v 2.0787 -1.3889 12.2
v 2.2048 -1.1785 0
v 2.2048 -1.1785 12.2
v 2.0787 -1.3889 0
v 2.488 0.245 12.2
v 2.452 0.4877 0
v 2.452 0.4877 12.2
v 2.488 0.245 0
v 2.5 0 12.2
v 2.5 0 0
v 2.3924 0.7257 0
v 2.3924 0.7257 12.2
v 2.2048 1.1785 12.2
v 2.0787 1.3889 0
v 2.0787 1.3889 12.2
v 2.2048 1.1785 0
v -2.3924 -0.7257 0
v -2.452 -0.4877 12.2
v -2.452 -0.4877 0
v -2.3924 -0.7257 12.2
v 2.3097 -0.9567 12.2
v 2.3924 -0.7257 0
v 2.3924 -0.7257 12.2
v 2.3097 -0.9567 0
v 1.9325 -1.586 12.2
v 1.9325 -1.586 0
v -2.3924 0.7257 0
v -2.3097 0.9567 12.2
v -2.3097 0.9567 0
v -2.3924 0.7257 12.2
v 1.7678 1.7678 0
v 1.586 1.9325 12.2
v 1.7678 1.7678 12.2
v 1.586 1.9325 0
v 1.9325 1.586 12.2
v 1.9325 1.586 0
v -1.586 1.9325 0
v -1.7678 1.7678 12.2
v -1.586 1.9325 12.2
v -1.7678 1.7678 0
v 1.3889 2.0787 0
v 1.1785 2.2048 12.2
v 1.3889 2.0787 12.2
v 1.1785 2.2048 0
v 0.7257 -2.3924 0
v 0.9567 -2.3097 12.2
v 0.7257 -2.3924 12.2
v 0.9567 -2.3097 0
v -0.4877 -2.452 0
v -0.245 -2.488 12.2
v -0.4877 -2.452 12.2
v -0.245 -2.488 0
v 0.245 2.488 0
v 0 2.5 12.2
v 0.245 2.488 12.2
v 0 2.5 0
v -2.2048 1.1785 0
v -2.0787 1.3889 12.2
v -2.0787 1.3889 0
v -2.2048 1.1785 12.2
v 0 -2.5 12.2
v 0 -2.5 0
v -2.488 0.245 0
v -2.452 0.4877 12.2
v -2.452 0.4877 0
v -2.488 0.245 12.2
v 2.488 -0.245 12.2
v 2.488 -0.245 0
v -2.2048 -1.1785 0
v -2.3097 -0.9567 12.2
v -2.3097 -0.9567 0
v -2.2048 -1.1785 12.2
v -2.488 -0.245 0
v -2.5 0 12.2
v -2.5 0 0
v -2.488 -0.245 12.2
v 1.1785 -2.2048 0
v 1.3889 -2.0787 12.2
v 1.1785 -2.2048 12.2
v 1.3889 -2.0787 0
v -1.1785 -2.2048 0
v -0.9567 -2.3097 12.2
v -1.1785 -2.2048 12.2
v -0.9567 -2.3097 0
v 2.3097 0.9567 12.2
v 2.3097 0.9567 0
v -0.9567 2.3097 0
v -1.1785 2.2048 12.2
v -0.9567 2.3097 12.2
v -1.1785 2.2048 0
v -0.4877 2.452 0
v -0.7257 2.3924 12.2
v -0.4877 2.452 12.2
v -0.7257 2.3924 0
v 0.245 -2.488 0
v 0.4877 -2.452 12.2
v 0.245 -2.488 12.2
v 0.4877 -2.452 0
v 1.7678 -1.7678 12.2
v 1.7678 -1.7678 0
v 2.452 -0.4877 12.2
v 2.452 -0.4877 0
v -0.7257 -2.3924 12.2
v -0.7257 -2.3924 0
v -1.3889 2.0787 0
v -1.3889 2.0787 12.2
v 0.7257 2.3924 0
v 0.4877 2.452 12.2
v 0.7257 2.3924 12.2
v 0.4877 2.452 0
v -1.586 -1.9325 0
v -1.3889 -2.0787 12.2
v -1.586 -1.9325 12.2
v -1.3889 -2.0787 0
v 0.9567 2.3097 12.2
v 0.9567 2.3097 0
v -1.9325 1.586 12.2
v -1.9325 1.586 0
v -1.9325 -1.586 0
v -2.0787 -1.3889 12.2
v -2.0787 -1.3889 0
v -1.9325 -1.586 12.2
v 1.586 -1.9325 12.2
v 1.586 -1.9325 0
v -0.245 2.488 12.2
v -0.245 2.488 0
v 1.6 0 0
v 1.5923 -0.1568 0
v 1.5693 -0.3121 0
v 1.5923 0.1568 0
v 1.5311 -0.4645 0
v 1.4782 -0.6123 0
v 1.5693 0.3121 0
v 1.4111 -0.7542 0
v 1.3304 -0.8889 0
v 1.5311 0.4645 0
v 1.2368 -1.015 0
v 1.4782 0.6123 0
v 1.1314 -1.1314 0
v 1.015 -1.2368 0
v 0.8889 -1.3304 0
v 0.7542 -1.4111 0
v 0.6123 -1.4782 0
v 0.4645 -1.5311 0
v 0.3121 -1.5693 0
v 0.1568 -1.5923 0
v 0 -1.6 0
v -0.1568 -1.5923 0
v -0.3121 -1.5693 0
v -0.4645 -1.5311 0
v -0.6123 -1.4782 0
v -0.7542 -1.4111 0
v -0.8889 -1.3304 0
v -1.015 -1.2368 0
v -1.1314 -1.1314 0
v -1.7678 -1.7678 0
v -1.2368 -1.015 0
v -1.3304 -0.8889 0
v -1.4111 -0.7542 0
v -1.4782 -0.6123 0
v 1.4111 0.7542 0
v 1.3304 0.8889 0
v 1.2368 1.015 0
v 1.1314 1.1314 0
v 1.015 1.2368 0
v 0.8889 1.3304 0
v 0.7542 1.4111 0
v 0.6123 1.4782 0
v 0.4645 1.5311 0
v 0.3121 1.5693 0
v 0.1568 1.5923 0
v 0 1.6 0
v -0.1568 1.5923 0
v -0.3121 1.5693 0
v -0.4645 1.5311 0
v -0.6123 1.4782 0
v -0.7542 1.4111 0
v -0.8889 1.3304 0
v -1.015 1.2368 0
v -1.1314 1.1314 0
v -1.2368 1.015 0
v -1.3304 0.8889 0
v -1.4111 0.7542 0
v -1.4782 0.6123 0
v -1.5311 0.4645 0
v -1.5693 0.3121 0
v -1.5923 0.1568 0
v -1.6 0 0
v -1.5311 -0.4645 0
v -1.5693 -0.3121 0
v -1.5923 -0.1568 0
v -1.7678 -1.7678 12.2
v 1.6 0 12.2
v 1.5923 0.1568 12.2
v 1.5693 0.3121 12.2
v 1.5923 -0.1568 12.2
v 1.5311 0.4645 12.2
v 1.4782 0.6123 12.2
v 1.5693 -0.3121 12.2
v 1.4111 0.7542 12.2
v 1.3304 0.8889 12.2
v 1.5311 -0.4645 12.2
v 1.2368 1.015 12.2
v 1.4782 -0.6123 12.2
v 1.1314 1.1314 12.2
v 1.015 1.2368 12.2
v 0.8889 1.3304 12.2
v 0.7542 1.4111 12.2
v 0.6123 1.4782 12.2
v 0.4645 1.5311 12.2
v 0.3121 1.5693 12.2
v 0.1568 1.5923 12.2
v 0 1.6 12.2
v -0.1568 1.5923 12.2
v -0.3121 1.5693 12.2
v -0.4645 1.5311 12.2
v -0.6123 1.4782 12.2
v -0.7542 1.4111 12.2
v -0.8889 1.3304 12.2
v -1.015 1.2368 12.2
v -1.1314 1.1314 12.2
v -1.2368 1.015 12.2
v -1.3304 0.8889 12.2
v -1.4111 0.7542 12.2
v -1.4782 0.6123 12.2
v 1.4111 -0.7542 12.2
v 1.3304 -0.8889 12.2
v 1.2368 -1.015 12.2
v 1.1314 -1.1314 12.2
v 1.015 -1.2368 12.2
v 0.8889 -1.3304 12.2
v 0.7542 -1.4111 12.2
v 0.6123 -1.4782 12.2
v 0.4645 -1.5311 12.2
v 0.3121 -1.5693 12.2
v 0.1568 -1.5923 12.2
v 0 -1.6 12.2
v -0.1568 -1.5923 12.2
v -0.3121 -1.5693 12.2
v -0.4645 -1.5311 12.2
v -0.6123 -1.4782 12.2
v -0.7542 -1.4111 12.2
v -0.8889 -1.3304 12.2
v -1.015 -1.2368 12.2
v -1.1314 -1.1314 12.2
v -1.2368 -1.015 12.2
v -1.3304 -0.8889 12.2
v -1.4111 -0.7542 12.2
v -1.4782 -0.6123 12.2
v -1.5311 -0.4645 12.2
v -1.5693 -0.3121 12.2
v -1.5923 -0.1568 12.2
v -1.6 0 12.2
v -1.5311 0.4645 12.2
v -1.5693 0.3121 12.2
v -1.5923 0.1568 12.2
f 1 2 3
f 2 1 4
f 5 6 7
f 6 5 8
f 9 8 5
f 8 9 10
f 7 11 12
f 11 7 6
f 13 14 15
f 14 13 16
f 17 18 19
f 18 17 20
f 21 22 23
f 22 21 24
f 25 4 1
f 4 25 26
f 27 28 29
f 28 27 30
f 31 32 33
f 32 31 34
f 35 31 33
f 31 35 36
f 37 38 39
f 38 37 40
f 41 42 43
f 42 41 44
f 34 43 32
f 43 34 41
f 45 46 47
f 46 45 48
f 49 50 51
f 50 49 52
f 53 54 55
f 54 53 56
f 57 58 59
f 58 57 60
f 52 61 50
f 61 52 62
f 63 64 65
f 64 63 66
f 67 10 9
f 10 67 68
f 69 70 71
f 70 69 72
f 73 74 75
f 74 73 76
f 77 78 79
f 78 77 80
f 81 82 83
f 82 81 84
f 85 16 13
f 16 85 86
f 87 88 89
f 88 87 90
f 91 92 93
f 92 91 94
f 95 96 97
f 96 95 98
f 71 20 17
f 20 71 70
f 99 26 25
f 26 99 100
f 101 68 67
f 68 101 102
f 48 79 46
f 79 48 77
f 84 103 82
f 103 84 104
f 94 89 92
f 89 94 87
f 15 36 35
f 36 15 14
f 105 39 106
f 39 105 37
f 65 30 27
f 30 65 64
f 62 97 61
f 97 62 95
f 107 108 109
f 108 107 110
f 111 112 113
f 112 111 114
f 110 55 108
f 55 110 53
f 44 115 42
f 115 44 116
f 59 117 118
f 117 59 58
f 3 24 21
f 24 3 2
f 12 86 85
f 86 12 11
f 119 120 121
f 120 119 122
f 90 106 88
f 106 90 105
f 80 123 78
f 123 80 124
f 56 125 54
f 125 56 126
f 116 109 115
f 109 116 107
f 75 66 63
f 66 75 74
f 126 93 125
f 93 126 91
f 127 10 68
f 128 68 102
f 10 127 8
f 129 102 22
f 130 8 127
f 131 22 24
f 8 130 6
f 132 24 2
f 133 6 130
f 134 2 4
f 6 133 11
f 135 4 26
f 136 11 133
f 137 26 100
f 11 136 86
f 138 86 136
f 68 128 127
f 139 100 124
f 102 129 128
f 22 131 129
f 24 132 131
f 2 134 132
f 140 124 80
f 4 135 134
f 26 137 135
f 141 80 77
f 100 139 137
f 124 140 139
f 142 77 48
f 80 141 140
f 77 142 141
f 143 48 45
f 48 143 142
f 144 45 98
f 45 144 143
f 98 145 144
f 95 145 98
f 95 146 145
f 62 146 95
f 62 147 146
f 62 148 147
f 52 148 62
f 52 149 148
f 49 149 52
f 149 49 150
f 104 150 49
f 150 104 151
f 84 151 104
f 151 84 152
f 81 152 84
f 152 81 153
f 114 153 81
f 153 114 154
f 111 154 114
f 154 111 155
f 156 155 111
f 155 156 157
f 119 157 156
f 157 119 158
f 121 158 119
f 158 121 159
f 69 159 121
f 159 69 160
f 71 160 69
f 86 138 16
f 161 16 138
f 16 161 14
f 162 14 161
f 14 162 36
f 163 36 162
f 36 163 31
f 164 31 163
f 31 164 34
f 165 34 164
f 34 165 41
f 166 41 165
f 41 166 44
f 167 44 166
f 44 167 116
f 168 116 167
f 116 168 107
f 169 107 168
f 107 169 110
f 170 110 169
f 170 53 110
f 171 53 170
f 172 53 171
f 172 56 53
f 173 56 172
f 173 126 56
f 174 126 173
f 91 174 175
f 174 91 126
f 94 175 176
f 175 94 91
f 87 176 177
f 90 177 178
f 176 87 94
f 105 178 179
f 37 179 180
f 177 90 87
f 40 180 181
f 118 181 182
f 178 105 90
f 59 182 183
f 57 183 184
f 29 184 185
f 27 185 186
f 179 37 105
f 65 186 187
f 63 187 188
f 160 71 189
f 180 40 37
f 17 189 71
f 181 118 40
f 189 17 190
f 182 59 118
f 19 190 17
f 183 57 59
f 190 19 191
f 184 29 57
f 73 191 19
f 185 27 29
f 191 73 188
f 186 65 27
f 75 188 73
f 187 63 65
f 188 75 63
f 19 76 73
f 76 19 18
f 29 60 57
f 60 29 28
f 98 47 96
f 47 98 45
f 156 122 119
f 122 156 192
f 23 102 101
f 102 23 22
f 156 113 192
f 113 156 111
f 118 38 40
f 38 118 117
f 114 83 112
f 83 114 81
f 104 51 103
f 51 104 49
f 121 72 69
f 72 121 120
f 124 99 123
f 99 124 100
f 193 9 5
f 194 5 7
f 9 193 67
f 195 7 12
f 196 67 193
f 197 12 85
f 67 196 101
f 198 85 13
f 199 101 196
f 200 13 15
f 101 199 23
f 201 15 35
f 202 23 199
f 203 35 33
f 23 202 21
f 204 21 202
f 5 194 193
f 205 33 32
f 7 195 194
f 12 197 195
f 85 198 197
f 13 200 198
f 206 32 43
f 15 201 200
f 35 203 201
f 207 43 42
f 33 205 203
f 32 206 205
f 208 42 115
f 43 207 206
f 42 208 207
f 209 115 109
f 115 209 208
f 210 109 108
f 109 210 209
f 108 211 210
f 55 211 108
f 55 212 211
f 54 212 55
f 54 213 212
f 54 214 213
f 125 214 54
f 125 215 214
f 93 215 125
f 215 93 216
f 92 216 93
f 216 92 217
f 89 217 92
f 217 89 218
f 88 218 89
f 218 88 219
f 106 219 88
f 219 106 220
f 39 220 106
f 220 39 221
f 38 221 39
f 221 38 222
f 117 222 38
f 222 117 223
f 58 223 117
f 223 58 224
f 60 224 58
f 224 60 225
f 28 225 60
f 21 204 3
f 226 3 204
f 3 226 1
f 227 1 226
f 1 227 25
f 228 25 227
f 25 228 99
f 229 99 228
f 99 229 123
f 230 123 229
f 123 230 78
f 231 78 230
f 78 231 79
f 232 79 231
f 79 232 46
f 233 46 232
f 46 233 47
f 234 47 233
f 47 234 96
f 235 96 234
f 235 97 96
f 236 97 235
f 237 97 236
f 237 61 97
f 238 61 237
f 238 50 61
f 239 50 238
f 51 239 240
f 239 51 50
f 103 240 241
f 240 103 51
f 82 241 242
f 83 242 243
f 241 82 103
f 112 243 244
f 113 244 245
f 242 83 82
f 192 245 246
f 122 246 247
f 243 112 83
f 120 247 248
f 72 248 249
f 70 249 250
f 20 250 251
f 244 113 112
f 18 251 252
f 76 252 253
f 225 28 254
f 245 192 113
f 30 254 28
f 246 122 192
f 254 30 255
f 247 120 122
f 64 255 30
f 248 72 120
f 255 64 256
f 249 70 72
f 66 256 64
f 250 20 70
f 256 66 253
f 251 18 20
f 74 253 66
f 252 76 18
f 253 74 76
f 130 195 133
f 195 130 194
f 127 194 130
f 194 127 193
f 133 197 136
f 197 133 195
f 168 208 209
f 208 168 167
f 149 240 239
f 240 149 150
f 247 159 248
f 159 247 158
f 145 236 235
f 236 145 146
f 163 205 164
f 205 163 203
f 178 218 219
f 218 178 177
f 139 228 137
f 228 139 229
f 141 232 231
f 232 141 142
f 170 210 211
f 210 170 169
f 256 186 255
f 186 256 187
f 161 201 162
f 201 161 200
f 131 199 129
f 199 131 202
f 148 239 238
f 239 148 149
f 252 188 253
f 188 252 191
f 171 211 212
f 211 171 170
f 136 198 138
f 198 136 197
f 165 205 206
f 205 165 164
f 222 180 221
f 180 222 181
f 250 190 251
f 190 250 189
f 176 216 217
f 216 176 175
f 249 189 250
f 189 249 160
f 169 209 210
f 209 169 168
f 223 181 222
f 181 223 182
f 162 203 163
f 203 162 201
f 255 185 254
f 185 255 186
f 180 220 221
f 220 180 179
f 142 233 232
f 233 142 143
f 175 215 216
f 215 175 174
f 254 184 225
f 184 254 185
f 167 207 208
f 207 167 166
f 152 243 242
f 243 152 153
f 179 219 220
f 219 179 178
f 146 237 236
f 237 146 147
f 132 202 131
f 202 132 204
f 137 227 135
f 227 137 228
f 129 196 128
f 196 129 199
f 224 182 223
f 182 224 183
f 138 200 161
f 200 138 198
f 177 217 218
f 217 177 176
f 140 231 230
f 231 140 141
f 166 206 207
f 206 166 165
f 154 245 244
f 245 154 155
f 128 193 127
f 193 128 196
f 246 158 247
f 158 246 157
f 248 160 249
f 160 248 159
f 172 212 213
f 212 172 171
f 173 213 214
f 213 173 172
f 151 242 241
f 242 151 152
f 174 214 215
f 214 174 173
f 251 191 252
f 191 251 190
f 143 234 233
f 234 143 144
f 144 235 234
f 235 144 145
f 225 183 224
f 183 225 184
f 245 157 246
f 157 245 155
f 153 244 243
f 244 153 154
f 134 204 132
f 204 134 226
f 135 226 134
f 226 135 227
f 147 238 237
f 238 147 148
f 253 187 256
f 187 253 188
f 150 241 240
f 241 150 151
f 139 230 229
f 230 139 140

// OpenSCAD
// Metal stock / cut sleeves, reference solids, NOT printed.
kind="sleeve"; // [sleeve, plate]
length=12.2;
od=5;
id=3.2;
plate_w=5;
plate_l=12;
plate_t=1.5;
plate_hole=3.4;
$fn=64;
difference() {
    if(kind=="sleeve") cylinder(d=od,h=length);
    else union() {
        for(y=[-(plate_l-plate_w)/2,(plate_l-plate_w)/2])
            translate([0,y,0]) cylinder(d=plate_w,h=plate_t);
        translate([-plate_w/2,-(plate_l-plate_w)/2,0])
            cube([plate_w,plate_l-plate_w,plate_t]);
    }
    translate([0,0,-0.1]) cylinder(d=kind=="sleeve" ? id : plate_hole,
                                  h=(kind=="sleeve" ? length : plate_t)+0.2);
}
